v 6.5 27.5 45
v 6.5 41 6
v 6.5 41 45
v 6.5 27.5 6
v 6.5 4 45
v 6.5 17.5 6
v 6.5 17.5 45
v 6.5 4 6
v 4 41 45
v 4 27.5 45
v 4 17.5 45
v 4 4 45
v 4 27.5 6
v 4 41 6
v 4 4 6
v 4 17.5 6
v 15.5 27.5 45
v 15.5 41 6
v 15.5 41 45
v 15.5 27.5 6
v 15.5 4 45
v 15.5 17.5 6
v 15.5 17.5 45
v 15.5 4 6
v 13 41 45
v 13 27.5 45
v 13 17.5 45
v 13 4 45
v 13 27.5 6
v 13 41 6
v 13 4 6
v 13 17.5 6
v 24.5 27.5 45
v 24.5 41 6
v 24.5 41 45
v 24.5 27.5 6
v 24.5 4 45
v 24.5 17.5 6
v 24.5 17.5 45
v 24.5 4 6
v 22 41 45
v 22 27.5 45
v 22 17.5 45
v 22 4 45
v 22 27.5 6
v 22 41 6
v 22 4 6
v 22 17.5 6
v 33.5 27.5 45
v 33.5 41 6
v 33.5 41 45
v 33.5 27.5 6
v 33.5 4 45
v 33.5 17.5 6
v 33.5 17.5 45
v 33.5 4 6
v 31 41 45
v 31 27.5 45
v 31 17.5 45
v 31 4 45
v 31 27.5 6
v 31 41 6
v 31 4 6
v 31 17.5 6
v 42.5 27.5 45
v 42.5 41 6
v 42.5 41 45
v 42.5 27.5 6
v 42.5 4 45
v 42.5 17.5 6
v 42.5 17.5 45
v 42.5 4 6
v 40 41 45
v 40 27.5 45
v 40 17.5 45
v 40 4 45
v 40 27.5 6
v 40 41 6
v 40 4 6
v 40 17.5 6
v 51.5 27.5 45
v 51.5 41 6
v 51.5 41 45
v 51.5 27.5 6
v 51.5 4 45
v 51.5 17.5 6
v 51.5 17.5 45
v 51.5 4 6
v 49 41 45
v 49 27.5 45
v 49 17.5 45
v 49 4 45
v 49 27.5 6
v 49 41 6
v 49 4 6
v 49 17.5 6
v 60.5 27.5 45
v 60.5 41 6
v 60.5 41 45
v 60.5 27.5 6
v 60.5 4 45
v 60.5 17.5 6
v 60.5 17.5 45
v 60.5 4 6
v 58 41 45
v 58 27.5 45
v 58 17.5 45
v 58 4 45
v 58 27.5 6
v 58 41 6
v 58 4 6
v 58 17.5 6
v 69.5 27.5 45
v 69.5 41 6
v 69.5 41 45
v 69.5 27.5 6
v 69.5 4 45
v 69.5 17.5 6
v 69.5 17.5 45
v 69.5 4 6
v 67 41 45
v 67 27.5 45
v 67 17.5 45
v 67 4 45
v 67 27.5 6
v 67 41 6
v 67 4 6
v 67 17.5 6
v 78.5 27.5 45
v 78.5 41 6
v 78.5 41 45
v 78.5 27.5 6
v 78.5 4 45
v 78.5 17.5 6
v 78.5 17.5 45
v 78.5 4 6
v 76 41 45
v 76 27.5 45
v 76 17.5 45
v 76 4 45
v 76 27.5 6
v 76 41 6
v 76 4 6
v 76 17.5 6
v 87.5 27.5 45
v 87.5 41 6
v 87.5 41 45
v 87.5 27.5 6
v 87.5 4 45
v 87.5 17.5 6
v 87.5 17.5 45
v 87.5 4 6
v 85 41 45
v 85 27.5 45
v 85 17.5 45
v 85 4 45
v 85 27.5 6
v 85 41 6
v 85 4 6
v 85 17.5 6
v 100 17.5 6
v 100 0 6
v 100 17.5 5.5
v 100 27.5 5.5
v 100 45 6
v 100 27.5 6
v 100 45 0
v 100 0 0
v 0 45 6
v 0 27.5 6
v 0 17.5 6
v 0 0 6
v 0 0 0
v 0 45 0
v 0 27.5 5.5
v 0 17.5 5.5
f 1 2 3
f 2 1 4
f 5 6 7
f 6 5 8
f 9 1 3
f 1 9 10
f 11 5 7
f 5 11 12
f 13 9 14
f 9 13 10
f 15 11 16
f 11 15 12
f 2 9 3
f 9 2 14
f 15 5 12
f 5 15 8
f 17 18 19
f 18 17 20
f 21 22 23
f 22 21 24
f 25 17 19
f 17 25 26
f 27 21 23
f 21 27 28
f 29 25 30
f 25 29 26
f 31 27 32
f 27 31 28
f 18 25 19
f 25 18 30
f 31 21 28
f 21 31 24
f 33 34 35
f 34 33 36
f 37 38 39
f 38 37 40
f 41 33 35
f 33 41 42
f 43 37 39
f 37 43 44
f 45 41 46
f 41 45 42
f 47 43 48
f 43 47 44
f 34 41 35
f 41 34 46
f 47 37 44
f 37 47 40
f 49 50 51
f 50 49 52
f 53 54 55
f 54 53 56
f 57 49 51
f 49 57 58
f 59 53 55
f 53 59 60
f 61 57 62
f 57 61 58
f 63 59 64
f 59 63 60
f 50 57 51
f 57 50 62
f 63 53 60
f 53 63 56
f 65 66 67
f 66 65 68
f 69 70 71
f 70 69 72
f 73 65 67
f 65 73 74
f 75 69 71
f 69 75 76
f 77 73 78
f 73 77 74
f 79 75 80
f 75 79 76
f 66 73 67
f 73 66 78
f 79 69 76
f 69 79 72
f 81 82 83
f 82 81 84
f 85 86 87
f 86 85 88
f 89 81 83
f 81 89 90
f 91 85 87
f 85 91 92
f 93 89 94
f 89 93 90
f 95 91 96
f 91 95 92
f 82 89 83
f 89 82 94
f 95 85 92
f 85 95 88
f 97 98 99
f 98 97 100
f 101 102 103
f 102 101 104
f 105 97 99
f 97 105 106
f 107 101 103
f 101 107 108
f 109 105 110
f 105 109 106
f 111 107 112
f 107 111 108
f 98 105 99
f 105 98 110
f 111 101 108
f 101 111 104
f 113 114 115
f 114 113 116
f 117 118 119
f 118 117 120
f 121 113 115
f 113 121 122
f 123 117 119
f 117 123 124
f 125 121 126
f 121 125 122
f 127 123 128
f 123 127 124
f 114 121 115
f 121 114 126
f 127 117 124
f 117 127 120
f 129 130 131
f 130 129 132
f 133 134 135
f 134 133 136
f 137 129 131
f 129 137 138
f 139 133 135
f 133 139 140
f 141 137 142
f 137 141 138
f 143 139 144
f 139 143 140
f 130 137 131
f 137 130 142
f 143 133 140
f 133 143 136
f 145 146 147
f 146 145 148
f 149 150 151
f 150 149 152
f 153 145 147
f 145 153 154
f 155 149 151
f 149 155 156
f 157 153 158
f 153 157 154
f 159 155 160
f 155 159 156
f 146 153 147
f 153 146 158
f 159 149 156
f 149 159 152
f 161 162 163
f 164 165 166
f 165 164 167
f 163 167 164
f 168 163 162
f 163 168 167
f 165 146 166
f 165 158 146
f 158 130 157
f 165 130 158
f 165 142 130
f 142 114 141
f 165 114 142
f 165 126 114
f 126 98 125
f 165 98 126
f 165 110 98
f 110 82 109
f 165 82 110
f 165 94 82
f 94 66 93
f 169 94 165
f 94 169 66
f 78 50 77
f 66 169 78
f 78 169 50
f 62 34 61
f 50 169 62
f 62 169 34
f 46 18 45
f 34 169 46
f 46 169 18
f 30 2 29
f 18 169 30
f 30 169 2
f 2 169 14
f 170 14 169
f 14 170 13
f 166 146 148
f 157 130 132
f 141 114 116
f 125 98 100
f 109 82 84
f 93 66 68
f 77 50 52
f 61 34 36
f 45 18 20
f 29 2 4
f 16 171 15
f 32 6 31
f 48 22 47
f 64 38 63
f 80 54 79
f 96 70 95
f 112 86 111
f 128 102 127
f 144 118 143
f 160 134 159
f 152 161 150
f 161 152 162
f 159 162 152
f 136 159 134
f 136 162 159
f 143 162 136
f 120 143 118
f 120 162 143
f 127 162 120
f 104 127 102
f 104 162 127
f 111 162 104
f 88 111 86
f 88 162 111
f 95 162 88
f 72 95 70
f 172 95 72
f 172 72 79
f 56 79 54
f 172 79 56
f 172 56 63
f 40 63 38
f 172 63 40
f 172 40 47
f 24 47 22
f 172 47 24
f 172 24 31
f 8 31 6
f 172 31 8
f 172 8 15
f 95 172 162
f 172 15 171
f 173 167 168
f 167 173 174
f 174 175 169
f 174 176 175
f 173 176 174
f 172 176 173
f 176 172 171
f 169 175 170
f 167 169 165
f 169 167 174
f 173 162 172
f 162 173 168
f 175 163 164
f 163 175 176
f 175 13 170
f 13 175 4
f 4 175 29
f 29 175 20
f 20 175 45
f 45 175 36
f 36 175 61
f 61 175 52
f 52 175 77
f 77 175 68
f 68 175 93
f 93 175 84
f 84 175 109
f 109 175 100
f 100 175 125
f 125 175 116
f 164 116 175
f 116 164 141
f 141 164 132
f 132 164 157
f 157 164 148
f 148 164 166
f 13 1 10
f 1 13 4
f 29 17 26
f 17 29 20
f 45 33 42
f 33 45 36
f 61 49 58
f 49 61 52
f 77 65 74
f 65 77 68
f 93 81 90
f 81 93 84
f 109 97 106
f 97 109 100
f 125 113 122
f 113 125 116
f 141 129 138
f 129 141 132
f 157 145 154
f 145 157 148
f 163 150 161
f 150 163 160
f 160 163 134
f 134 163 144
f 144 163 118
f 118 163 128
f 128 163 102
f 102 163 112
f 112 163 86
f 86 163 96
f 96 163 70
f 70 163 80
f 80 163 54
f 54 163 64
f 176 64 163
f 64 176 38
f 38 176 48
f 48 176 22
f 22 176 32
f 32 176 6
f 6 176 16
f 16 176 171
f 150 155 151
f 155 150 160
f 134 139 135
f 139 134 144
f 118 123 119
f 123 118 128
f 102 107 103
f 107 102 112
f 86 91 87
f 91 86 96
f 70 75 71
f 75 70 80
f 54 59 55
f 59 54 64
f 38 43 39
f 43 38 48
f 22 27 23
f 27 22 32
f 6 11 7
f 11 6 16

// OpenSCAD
$fn = 32;

// ----------------------------------------------------------------------
// Heatsink: slotted fin block
// ----------------------------------------------------------------------

// --- parameters (mm) ---
base_l = 100;             // base length, X
base_w = 45;              // base width, Y
base_t = 6;               // base plate thickness
fin_h = 40;               // fin height above the base
fin_t = 2.5;              // fin thickness
edge = 4;                 // margin from the base ends
pitch = 9;                // fin pitch
slot_w = 10;              // central slot width, Y
fit_tol = 0.02;           // tolerance for press fits, mm
free_tol = 0.2;           // tolerance for clearance fits, mm

n_fins = floor((base_l - 2 * edge - fin_t) / pitch) + 1;  // fin count
total_h = base_t + fin_h - 1;  // overall height

difference() {
union() {
  cube([base_l, base_w, base_t]);
  for (i = [0 : n_fins - 1])
    translate([edge + i * pitch, edge, base_t - 1])
      cube([fin_t, base_w - 2 * edge, fin_h]);
}
  translate([-1, base_w / 2 - slot_w / 2, base_t - 0.5])
    cube([base_l + 2, slot_w, fin_h + 2]);
}
